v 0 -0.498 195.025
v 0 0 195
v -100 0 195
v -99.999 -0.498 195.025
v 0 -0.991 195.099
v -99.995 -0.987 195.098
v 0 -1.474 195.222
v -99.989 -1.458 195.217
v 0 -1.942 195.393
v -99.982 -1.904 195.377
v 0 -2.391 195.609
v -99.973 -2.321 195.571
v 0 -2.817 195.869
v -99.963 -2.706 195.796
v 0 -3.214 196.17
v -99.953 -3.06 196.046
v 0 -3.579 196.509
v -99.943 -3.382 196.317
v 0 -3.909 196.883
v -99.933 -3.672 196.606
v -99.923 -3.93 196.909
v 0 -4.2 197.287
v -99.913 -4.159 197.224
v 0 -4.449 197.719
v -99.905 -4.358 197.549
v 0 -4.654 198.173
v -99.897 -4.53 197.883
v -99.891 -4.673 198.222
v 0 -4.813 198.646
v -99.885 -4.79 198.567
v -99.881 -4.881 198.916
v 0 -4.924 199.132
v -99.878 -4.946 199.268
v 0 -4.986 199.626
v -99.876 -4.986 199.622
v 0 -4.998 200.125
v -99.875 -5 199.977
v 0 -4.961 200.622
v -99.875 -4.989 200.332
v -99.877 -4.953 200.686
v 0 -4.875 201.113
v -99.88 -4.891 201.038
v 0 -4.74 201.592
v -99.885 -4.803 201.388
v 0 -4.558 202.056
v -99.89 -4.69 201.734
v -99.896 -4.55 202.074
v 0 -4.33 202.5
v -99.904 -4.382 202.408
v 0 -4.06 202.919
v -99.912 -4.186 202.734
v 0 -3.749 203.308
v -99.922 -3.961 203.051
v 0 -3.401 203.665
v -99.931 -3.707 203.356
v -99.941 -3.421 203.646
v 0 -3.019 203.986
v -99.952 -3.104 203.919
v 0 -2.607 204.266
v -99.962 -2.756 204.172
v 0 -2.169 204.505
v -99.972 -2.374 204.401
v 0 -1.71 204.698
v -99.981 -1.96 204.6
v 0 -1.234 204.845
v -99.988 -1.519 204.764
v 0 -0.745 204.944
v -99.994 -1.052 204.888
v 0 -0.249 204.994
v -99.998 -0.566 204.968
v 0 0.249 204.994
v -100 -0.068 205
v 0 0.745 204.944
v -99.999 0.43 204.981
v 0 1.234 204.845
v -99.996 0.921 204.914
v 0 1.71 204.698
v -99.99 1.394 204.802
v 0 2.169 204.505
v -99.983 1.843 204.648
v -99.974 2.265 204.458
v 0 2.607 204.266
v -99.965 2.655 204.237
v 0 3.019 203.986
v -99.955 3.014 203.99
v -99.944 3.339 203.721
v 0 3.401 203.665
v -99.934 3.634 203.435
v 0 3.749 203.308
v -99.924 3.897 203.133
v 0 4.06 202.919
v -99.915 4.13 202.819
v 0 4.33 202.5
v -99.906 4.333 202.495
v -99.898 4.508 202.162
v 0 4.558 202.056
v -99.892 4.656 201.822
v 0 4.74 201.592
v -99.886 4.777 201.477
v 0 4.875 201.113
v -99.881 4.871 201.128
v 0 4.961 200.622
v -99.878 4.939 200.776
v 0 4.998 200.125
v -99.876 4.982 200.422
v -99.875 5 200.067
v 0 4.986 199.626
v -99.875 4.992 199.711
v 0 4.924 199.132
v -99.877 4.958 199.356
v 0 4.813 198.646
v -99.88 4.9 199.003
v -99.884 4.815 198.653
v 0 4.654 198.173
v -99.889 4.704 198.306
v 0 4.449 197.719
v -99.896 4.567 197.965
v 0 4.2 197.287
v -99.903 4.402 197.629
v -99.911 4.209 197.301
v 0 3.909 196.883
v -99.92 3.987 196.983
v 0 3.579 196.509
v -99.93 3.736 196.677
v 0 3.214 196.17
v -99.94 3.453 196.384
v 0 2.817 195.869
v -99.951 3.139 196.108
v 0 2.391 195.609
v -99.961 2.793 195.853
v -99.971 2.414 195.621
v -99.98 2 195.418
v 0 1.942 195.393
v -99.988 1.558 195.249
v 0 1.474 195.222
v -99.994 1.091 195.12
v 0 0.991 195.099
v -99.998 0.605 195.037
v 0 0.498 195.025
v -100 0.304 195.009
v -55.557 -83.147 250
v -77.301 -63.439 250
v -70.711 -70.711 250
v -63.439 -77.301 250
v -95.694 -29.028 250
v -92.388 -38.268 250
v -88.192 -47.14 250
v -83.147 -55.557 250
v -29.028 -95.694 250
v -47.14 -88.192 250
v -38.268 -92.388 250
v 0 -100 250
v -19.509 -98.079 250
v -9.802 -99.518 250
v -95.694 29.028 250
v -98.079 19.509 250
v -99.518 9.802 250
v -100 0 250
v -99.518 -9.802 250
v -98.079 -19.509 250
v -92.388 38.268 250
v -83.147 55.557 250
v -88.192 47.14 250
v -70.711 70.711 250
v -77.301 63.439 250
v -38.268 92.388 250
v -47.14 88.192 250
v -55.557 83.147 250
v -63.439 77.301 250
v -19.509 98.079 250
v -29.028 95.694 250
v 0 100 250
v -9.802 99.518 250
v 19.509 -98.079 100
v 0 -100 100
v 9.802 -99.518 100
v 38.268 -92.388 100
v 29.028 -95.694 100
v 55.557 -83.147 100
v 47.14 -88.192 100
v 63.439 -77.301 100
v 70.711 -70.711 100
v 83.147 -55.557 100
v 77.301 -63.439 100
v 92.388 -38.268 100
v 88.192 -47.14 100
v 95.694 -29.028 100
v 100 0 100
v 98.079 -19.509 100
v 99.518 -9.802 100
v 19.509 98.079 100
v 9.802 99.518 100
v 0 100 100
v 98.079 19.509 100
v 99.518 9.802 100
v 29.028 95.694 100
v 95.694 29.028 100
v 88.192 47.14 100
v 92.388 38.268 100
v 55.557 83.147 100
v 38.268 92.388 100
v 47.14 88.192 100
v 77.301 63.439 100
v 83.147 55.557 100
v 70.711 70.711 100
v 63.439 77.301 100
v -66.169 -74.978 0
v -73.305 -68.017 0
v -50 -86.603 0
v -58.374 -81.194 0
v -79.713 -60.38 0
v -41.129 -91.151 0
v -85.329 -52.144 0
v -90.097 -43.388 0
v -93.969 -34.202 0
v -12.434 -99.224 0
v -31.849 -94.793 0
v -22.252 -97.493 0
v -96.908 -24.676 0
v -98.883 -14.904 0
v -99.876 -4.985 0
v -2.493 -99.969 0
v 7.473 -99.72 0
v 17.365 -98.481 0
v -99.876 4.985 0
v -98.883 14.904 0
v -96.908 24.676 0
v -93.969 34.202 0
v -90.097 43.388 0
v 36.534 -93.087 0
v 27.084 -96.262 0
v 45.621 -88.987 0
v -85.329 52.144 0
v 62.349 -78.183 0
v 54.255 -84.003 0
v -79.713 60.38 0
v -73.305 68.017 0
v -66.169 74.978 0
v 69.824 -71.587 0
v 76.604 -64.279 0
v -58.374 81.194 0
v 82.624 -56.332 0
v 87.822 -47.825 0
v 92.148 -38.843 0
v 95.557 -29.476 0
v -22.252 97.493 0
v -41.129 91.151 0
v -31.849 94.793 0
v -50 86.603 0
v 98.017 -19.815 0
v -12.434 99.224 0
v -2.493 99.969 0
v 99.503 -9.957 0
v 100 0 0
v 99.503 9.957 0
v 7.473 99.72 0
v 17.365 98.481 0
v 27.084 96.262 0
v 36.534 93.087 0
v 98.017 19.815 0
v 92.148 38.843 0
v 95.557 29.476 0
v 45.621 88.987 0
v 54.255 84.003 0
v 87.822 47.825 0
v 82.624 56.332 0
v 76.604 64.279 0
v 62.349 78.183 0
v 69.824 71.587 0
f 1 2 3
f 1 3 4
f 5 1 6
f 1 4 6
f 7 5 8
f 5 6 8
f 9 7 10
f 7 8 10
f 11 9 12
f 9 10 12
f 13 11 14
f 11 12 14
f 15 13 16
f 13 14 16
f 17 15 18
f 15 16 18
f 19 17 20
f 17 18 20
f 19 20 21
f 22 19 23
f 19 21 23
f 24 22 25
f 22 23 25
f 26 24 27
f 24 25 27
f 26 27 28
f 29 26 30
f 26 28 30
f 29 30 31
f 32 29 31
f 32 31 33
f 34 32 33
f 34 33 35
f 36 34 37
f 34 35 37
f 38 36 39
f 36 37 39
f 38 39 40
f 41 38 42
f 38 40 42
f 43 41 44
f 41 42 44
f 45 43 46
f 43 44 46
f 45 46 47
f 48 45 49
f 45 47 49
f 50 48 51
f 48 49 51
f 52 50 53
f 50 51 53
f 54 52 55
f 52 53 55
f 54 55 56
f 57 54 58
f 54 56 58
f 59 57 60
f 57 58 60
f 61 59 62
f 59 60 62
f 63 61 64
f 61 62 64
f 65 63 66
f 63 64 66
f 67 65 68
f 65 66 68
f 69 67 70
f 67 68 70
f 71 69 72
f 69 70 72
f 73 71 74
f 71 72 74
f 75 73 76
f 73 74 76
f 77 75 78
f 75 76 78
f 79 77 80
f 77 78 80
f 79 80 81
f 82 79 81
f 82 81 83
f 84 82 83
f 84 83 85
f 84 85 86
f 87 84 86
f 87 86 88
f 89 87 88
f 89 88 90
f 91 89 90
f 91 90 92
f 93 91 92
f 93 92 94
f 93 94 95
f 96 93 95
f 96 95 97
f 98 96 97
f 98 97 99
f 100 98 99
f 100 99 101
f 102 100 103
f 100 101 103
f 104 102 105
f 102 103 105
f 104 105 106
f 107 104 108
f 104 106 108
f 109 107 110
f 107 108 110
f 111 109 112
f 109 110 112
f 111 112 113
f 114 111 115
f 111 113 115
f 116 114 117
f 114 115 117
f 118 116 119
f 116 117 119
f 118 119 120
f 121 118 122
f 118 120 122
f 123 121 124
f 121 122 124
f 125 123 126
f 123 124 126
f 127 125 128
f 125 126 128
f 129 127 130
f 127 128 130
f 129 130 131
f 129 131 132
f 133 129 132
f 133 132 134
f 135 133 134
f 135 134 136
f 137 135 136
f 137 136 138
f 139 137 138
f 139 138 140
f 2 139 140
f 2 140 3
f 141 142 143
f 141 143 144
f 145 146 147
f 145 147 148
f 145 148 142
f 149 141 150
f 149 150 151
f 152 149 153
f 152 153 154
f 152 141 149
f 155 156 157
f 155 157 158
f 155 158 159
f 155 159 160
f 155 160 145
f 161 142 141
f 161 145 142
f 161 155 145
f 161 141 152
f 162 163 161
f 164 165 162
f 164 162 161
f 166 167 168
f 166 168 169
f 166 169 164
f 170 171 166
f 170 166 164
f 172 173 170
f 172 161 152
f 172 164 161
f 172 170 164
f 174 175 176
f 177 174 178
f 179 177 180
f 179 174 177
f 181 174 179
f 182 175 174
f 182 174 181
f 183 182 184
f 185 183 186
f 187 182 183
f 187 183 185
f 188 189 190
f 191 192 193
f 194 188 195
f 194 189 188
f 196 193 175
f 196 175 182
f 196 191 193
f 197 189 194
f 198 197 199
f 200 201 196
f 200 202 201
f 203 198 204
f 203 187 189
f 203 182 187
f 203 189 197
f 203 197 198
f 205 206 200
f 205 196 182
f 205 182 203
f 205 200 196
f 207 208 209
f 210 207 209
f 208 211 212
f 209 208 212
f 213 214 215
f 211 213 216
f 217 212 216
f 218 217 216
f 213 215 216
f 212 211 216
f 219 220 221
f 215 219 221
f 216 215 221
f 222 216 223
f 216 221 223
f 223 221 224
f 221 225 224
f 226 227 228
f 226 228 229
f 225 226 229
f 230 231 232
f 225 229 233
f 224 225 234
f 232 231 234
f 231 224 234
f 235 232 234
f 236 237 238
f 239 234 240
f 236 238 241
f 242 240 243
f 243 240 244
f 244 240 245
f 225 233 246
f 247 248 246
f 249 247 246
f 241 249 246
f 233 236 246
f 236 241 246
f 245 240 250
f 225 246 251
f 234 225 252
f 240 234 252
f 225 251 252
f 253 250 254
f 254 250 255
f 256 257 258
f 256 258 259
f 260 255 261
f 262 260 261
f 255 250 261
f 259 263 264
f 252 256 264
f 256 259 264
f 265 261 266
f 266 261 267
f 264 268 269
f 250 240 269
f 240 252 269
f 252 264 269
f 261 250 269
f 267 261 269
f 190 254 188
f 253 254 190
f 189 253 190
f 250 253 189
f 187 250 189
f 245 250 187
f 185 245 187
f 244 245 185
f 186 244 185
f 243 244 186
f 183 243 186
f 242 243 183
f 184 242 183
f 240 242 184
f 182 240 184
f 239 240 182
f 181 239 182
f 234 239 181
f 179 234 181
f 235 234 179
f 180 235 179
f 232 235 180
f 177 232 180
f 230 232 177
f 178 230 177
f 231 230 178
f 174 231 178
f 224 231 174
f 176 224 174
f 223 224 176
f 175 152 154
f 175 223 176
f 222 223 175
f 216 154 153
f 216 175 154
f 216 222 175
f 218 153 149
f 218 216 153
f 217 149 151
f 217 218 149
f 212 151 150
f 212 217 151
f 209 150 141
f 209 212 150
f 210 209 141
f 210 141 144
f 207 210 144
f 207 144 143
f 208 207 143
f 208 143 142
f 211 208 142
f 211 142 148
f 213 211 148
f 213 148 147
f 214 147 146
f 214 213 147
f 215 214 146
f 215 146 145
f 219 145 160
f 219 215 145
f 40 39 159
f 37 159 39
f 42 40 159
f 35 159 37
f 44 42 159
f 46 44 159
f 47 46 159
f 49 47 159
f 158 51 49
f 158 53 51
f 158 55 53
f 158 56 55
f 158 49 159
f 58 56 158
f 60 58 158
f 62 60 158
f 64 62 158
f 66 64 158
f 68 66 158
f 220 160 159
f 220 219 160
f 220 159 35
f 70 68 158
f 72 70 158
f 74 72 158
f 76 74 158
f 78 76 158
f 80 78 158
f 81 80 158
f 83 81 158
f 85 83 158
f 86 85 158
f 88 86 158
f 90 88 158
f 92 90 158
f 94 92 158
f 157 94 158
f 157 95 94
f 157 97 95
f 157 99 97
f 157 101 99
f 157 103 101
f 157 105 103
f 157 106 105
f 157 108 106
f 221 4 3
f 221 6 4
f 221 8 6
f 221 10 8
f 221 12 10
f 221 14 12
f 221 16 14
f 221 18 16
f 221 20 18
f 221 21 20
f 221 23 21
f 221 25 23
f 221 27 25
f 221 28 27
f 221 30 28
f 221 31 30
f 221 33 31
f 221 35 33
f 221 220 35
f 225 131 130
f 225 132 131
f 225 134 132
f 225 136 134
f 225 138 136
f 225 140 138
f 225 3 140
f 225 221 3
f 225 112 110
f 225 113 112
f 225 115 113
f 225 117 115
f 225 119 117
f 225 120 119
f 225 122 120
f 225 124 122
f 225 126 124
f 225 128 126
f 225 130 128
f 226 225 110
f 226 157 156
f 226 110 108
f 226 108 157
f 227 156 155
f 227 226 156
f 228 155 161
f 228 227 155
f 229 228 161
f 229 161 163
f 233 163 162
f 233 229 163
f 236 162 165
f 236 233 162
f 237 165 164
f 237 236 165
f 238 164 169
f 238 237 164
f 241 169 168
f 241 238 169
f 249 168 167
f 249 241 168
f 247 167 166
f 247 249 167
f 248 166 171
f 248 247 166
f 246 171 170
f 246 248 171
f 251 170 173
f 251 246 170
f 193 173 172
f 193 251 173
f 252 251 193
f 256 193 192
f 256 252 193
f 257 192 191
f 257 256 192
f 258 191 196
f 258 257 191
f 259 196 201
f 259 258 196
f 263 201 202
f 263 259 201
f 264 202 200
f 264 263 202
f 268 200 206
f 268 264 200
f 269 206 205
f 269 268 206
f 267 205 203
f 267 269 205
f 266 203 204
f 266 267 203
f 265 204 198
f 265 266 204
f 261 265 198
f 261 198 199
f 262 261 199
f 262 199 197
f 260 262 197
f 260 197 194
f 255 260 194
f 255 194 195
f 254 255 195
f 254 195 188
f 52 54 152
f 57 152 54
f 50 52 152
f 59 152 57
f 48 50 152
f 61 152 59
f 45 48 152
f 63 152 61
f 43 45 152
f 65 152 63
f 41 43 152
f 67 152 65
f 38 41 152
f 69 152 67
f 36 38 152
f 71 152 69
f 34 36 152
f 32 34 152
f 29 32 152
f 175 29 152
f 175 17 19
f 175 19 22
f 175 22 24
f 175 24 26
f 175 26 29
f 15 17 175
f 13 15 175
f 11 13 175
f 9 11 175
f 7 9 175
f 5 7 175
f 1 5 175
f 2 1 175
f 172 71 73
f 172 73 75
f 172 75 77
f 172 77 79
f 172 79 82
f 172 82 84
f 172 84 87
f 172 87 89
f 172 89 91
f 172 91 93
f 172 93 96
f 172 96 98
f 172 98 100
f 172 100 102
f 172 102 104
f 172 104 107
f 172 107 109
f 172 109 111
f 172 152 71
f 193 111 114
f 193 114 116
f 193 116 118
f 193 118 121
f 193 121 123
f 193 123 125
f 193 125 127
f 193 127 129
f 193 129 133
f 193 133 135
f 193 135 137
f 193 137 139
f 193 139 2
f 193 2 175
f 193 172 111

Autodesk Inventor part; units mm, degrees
ref_plane "YZ Plane" through (0, 0, 0) normal (1, 0, 0) x (0, 1, 0)
ref_plane "XZ Plane" through (0, 0, 0) normal (0, 1, 0) x (-1, 0, 0)
ref_plane "XY Plane" through (0, 0, 0) normal (0, 0, 1) x (1, 0, 0)
sketch "Sketch1" plane through (0, 0, 0) normal (0, 0, 1) x (1, 0, 0)
  circle A0 centre (0, 0) radius 100
  dimension "d0" = 200
extrude "Extrusion1" add sketch "Sketch1" along normal blind 250
sketch "Sketch2" plane through (0, 0, 250) normal (0, 0, 1) x (1, 0, 0)
  circle A0 centre (0, 0) radius 100 projected
  line L0 (-100, 50) -> (-100, -50) construction
  dimension "d3" = 100
  dimension "d4" = 50
ref_plane "Work Plane1" through (0, 0, 250) normal (0, -1, 0) x (1, 0, 0)
sketch "Sketch3" plane through (0, 0, 250) normal (0, -1, 0) x (1, 0, 0)
  line L0 (100, 0) -> (-100, 0) projected
  line L1 (100, 0) -> (0, 0)
  line L2 (0, 0) -> (0, -150)
  line L3 (0, -150) -> (100, -150)
  line L4 (100, -150) -> (100, 0)
  point P0 (0, -250)
  point P1 (0, 0)
  dimension "d6" = 150
  dimension "d17" = 100
extrude "Extrusion2" cut sketch "Sketch3" along normal through all both and the other way through all
sketch "Sketch4" plane through (0, -50, 125) normal (1, 0, 0) x (0, 0, -1)
  circle A0 centre (-75, 50) radius 5
  line L0 (-125, -50) -> (-125, 150) projected
  point P0 (125, 50)
  dimension "d9" = 10
  dimension "d18" = 50
hole "Hole1" at (0, 0, 200) direction (-1, 0, 0) diameter 10 end through all
equation "\"d4\" = 0.5 * d3"
equation "\"d18\" = 0.5 * d3"
properties part number "link1"
